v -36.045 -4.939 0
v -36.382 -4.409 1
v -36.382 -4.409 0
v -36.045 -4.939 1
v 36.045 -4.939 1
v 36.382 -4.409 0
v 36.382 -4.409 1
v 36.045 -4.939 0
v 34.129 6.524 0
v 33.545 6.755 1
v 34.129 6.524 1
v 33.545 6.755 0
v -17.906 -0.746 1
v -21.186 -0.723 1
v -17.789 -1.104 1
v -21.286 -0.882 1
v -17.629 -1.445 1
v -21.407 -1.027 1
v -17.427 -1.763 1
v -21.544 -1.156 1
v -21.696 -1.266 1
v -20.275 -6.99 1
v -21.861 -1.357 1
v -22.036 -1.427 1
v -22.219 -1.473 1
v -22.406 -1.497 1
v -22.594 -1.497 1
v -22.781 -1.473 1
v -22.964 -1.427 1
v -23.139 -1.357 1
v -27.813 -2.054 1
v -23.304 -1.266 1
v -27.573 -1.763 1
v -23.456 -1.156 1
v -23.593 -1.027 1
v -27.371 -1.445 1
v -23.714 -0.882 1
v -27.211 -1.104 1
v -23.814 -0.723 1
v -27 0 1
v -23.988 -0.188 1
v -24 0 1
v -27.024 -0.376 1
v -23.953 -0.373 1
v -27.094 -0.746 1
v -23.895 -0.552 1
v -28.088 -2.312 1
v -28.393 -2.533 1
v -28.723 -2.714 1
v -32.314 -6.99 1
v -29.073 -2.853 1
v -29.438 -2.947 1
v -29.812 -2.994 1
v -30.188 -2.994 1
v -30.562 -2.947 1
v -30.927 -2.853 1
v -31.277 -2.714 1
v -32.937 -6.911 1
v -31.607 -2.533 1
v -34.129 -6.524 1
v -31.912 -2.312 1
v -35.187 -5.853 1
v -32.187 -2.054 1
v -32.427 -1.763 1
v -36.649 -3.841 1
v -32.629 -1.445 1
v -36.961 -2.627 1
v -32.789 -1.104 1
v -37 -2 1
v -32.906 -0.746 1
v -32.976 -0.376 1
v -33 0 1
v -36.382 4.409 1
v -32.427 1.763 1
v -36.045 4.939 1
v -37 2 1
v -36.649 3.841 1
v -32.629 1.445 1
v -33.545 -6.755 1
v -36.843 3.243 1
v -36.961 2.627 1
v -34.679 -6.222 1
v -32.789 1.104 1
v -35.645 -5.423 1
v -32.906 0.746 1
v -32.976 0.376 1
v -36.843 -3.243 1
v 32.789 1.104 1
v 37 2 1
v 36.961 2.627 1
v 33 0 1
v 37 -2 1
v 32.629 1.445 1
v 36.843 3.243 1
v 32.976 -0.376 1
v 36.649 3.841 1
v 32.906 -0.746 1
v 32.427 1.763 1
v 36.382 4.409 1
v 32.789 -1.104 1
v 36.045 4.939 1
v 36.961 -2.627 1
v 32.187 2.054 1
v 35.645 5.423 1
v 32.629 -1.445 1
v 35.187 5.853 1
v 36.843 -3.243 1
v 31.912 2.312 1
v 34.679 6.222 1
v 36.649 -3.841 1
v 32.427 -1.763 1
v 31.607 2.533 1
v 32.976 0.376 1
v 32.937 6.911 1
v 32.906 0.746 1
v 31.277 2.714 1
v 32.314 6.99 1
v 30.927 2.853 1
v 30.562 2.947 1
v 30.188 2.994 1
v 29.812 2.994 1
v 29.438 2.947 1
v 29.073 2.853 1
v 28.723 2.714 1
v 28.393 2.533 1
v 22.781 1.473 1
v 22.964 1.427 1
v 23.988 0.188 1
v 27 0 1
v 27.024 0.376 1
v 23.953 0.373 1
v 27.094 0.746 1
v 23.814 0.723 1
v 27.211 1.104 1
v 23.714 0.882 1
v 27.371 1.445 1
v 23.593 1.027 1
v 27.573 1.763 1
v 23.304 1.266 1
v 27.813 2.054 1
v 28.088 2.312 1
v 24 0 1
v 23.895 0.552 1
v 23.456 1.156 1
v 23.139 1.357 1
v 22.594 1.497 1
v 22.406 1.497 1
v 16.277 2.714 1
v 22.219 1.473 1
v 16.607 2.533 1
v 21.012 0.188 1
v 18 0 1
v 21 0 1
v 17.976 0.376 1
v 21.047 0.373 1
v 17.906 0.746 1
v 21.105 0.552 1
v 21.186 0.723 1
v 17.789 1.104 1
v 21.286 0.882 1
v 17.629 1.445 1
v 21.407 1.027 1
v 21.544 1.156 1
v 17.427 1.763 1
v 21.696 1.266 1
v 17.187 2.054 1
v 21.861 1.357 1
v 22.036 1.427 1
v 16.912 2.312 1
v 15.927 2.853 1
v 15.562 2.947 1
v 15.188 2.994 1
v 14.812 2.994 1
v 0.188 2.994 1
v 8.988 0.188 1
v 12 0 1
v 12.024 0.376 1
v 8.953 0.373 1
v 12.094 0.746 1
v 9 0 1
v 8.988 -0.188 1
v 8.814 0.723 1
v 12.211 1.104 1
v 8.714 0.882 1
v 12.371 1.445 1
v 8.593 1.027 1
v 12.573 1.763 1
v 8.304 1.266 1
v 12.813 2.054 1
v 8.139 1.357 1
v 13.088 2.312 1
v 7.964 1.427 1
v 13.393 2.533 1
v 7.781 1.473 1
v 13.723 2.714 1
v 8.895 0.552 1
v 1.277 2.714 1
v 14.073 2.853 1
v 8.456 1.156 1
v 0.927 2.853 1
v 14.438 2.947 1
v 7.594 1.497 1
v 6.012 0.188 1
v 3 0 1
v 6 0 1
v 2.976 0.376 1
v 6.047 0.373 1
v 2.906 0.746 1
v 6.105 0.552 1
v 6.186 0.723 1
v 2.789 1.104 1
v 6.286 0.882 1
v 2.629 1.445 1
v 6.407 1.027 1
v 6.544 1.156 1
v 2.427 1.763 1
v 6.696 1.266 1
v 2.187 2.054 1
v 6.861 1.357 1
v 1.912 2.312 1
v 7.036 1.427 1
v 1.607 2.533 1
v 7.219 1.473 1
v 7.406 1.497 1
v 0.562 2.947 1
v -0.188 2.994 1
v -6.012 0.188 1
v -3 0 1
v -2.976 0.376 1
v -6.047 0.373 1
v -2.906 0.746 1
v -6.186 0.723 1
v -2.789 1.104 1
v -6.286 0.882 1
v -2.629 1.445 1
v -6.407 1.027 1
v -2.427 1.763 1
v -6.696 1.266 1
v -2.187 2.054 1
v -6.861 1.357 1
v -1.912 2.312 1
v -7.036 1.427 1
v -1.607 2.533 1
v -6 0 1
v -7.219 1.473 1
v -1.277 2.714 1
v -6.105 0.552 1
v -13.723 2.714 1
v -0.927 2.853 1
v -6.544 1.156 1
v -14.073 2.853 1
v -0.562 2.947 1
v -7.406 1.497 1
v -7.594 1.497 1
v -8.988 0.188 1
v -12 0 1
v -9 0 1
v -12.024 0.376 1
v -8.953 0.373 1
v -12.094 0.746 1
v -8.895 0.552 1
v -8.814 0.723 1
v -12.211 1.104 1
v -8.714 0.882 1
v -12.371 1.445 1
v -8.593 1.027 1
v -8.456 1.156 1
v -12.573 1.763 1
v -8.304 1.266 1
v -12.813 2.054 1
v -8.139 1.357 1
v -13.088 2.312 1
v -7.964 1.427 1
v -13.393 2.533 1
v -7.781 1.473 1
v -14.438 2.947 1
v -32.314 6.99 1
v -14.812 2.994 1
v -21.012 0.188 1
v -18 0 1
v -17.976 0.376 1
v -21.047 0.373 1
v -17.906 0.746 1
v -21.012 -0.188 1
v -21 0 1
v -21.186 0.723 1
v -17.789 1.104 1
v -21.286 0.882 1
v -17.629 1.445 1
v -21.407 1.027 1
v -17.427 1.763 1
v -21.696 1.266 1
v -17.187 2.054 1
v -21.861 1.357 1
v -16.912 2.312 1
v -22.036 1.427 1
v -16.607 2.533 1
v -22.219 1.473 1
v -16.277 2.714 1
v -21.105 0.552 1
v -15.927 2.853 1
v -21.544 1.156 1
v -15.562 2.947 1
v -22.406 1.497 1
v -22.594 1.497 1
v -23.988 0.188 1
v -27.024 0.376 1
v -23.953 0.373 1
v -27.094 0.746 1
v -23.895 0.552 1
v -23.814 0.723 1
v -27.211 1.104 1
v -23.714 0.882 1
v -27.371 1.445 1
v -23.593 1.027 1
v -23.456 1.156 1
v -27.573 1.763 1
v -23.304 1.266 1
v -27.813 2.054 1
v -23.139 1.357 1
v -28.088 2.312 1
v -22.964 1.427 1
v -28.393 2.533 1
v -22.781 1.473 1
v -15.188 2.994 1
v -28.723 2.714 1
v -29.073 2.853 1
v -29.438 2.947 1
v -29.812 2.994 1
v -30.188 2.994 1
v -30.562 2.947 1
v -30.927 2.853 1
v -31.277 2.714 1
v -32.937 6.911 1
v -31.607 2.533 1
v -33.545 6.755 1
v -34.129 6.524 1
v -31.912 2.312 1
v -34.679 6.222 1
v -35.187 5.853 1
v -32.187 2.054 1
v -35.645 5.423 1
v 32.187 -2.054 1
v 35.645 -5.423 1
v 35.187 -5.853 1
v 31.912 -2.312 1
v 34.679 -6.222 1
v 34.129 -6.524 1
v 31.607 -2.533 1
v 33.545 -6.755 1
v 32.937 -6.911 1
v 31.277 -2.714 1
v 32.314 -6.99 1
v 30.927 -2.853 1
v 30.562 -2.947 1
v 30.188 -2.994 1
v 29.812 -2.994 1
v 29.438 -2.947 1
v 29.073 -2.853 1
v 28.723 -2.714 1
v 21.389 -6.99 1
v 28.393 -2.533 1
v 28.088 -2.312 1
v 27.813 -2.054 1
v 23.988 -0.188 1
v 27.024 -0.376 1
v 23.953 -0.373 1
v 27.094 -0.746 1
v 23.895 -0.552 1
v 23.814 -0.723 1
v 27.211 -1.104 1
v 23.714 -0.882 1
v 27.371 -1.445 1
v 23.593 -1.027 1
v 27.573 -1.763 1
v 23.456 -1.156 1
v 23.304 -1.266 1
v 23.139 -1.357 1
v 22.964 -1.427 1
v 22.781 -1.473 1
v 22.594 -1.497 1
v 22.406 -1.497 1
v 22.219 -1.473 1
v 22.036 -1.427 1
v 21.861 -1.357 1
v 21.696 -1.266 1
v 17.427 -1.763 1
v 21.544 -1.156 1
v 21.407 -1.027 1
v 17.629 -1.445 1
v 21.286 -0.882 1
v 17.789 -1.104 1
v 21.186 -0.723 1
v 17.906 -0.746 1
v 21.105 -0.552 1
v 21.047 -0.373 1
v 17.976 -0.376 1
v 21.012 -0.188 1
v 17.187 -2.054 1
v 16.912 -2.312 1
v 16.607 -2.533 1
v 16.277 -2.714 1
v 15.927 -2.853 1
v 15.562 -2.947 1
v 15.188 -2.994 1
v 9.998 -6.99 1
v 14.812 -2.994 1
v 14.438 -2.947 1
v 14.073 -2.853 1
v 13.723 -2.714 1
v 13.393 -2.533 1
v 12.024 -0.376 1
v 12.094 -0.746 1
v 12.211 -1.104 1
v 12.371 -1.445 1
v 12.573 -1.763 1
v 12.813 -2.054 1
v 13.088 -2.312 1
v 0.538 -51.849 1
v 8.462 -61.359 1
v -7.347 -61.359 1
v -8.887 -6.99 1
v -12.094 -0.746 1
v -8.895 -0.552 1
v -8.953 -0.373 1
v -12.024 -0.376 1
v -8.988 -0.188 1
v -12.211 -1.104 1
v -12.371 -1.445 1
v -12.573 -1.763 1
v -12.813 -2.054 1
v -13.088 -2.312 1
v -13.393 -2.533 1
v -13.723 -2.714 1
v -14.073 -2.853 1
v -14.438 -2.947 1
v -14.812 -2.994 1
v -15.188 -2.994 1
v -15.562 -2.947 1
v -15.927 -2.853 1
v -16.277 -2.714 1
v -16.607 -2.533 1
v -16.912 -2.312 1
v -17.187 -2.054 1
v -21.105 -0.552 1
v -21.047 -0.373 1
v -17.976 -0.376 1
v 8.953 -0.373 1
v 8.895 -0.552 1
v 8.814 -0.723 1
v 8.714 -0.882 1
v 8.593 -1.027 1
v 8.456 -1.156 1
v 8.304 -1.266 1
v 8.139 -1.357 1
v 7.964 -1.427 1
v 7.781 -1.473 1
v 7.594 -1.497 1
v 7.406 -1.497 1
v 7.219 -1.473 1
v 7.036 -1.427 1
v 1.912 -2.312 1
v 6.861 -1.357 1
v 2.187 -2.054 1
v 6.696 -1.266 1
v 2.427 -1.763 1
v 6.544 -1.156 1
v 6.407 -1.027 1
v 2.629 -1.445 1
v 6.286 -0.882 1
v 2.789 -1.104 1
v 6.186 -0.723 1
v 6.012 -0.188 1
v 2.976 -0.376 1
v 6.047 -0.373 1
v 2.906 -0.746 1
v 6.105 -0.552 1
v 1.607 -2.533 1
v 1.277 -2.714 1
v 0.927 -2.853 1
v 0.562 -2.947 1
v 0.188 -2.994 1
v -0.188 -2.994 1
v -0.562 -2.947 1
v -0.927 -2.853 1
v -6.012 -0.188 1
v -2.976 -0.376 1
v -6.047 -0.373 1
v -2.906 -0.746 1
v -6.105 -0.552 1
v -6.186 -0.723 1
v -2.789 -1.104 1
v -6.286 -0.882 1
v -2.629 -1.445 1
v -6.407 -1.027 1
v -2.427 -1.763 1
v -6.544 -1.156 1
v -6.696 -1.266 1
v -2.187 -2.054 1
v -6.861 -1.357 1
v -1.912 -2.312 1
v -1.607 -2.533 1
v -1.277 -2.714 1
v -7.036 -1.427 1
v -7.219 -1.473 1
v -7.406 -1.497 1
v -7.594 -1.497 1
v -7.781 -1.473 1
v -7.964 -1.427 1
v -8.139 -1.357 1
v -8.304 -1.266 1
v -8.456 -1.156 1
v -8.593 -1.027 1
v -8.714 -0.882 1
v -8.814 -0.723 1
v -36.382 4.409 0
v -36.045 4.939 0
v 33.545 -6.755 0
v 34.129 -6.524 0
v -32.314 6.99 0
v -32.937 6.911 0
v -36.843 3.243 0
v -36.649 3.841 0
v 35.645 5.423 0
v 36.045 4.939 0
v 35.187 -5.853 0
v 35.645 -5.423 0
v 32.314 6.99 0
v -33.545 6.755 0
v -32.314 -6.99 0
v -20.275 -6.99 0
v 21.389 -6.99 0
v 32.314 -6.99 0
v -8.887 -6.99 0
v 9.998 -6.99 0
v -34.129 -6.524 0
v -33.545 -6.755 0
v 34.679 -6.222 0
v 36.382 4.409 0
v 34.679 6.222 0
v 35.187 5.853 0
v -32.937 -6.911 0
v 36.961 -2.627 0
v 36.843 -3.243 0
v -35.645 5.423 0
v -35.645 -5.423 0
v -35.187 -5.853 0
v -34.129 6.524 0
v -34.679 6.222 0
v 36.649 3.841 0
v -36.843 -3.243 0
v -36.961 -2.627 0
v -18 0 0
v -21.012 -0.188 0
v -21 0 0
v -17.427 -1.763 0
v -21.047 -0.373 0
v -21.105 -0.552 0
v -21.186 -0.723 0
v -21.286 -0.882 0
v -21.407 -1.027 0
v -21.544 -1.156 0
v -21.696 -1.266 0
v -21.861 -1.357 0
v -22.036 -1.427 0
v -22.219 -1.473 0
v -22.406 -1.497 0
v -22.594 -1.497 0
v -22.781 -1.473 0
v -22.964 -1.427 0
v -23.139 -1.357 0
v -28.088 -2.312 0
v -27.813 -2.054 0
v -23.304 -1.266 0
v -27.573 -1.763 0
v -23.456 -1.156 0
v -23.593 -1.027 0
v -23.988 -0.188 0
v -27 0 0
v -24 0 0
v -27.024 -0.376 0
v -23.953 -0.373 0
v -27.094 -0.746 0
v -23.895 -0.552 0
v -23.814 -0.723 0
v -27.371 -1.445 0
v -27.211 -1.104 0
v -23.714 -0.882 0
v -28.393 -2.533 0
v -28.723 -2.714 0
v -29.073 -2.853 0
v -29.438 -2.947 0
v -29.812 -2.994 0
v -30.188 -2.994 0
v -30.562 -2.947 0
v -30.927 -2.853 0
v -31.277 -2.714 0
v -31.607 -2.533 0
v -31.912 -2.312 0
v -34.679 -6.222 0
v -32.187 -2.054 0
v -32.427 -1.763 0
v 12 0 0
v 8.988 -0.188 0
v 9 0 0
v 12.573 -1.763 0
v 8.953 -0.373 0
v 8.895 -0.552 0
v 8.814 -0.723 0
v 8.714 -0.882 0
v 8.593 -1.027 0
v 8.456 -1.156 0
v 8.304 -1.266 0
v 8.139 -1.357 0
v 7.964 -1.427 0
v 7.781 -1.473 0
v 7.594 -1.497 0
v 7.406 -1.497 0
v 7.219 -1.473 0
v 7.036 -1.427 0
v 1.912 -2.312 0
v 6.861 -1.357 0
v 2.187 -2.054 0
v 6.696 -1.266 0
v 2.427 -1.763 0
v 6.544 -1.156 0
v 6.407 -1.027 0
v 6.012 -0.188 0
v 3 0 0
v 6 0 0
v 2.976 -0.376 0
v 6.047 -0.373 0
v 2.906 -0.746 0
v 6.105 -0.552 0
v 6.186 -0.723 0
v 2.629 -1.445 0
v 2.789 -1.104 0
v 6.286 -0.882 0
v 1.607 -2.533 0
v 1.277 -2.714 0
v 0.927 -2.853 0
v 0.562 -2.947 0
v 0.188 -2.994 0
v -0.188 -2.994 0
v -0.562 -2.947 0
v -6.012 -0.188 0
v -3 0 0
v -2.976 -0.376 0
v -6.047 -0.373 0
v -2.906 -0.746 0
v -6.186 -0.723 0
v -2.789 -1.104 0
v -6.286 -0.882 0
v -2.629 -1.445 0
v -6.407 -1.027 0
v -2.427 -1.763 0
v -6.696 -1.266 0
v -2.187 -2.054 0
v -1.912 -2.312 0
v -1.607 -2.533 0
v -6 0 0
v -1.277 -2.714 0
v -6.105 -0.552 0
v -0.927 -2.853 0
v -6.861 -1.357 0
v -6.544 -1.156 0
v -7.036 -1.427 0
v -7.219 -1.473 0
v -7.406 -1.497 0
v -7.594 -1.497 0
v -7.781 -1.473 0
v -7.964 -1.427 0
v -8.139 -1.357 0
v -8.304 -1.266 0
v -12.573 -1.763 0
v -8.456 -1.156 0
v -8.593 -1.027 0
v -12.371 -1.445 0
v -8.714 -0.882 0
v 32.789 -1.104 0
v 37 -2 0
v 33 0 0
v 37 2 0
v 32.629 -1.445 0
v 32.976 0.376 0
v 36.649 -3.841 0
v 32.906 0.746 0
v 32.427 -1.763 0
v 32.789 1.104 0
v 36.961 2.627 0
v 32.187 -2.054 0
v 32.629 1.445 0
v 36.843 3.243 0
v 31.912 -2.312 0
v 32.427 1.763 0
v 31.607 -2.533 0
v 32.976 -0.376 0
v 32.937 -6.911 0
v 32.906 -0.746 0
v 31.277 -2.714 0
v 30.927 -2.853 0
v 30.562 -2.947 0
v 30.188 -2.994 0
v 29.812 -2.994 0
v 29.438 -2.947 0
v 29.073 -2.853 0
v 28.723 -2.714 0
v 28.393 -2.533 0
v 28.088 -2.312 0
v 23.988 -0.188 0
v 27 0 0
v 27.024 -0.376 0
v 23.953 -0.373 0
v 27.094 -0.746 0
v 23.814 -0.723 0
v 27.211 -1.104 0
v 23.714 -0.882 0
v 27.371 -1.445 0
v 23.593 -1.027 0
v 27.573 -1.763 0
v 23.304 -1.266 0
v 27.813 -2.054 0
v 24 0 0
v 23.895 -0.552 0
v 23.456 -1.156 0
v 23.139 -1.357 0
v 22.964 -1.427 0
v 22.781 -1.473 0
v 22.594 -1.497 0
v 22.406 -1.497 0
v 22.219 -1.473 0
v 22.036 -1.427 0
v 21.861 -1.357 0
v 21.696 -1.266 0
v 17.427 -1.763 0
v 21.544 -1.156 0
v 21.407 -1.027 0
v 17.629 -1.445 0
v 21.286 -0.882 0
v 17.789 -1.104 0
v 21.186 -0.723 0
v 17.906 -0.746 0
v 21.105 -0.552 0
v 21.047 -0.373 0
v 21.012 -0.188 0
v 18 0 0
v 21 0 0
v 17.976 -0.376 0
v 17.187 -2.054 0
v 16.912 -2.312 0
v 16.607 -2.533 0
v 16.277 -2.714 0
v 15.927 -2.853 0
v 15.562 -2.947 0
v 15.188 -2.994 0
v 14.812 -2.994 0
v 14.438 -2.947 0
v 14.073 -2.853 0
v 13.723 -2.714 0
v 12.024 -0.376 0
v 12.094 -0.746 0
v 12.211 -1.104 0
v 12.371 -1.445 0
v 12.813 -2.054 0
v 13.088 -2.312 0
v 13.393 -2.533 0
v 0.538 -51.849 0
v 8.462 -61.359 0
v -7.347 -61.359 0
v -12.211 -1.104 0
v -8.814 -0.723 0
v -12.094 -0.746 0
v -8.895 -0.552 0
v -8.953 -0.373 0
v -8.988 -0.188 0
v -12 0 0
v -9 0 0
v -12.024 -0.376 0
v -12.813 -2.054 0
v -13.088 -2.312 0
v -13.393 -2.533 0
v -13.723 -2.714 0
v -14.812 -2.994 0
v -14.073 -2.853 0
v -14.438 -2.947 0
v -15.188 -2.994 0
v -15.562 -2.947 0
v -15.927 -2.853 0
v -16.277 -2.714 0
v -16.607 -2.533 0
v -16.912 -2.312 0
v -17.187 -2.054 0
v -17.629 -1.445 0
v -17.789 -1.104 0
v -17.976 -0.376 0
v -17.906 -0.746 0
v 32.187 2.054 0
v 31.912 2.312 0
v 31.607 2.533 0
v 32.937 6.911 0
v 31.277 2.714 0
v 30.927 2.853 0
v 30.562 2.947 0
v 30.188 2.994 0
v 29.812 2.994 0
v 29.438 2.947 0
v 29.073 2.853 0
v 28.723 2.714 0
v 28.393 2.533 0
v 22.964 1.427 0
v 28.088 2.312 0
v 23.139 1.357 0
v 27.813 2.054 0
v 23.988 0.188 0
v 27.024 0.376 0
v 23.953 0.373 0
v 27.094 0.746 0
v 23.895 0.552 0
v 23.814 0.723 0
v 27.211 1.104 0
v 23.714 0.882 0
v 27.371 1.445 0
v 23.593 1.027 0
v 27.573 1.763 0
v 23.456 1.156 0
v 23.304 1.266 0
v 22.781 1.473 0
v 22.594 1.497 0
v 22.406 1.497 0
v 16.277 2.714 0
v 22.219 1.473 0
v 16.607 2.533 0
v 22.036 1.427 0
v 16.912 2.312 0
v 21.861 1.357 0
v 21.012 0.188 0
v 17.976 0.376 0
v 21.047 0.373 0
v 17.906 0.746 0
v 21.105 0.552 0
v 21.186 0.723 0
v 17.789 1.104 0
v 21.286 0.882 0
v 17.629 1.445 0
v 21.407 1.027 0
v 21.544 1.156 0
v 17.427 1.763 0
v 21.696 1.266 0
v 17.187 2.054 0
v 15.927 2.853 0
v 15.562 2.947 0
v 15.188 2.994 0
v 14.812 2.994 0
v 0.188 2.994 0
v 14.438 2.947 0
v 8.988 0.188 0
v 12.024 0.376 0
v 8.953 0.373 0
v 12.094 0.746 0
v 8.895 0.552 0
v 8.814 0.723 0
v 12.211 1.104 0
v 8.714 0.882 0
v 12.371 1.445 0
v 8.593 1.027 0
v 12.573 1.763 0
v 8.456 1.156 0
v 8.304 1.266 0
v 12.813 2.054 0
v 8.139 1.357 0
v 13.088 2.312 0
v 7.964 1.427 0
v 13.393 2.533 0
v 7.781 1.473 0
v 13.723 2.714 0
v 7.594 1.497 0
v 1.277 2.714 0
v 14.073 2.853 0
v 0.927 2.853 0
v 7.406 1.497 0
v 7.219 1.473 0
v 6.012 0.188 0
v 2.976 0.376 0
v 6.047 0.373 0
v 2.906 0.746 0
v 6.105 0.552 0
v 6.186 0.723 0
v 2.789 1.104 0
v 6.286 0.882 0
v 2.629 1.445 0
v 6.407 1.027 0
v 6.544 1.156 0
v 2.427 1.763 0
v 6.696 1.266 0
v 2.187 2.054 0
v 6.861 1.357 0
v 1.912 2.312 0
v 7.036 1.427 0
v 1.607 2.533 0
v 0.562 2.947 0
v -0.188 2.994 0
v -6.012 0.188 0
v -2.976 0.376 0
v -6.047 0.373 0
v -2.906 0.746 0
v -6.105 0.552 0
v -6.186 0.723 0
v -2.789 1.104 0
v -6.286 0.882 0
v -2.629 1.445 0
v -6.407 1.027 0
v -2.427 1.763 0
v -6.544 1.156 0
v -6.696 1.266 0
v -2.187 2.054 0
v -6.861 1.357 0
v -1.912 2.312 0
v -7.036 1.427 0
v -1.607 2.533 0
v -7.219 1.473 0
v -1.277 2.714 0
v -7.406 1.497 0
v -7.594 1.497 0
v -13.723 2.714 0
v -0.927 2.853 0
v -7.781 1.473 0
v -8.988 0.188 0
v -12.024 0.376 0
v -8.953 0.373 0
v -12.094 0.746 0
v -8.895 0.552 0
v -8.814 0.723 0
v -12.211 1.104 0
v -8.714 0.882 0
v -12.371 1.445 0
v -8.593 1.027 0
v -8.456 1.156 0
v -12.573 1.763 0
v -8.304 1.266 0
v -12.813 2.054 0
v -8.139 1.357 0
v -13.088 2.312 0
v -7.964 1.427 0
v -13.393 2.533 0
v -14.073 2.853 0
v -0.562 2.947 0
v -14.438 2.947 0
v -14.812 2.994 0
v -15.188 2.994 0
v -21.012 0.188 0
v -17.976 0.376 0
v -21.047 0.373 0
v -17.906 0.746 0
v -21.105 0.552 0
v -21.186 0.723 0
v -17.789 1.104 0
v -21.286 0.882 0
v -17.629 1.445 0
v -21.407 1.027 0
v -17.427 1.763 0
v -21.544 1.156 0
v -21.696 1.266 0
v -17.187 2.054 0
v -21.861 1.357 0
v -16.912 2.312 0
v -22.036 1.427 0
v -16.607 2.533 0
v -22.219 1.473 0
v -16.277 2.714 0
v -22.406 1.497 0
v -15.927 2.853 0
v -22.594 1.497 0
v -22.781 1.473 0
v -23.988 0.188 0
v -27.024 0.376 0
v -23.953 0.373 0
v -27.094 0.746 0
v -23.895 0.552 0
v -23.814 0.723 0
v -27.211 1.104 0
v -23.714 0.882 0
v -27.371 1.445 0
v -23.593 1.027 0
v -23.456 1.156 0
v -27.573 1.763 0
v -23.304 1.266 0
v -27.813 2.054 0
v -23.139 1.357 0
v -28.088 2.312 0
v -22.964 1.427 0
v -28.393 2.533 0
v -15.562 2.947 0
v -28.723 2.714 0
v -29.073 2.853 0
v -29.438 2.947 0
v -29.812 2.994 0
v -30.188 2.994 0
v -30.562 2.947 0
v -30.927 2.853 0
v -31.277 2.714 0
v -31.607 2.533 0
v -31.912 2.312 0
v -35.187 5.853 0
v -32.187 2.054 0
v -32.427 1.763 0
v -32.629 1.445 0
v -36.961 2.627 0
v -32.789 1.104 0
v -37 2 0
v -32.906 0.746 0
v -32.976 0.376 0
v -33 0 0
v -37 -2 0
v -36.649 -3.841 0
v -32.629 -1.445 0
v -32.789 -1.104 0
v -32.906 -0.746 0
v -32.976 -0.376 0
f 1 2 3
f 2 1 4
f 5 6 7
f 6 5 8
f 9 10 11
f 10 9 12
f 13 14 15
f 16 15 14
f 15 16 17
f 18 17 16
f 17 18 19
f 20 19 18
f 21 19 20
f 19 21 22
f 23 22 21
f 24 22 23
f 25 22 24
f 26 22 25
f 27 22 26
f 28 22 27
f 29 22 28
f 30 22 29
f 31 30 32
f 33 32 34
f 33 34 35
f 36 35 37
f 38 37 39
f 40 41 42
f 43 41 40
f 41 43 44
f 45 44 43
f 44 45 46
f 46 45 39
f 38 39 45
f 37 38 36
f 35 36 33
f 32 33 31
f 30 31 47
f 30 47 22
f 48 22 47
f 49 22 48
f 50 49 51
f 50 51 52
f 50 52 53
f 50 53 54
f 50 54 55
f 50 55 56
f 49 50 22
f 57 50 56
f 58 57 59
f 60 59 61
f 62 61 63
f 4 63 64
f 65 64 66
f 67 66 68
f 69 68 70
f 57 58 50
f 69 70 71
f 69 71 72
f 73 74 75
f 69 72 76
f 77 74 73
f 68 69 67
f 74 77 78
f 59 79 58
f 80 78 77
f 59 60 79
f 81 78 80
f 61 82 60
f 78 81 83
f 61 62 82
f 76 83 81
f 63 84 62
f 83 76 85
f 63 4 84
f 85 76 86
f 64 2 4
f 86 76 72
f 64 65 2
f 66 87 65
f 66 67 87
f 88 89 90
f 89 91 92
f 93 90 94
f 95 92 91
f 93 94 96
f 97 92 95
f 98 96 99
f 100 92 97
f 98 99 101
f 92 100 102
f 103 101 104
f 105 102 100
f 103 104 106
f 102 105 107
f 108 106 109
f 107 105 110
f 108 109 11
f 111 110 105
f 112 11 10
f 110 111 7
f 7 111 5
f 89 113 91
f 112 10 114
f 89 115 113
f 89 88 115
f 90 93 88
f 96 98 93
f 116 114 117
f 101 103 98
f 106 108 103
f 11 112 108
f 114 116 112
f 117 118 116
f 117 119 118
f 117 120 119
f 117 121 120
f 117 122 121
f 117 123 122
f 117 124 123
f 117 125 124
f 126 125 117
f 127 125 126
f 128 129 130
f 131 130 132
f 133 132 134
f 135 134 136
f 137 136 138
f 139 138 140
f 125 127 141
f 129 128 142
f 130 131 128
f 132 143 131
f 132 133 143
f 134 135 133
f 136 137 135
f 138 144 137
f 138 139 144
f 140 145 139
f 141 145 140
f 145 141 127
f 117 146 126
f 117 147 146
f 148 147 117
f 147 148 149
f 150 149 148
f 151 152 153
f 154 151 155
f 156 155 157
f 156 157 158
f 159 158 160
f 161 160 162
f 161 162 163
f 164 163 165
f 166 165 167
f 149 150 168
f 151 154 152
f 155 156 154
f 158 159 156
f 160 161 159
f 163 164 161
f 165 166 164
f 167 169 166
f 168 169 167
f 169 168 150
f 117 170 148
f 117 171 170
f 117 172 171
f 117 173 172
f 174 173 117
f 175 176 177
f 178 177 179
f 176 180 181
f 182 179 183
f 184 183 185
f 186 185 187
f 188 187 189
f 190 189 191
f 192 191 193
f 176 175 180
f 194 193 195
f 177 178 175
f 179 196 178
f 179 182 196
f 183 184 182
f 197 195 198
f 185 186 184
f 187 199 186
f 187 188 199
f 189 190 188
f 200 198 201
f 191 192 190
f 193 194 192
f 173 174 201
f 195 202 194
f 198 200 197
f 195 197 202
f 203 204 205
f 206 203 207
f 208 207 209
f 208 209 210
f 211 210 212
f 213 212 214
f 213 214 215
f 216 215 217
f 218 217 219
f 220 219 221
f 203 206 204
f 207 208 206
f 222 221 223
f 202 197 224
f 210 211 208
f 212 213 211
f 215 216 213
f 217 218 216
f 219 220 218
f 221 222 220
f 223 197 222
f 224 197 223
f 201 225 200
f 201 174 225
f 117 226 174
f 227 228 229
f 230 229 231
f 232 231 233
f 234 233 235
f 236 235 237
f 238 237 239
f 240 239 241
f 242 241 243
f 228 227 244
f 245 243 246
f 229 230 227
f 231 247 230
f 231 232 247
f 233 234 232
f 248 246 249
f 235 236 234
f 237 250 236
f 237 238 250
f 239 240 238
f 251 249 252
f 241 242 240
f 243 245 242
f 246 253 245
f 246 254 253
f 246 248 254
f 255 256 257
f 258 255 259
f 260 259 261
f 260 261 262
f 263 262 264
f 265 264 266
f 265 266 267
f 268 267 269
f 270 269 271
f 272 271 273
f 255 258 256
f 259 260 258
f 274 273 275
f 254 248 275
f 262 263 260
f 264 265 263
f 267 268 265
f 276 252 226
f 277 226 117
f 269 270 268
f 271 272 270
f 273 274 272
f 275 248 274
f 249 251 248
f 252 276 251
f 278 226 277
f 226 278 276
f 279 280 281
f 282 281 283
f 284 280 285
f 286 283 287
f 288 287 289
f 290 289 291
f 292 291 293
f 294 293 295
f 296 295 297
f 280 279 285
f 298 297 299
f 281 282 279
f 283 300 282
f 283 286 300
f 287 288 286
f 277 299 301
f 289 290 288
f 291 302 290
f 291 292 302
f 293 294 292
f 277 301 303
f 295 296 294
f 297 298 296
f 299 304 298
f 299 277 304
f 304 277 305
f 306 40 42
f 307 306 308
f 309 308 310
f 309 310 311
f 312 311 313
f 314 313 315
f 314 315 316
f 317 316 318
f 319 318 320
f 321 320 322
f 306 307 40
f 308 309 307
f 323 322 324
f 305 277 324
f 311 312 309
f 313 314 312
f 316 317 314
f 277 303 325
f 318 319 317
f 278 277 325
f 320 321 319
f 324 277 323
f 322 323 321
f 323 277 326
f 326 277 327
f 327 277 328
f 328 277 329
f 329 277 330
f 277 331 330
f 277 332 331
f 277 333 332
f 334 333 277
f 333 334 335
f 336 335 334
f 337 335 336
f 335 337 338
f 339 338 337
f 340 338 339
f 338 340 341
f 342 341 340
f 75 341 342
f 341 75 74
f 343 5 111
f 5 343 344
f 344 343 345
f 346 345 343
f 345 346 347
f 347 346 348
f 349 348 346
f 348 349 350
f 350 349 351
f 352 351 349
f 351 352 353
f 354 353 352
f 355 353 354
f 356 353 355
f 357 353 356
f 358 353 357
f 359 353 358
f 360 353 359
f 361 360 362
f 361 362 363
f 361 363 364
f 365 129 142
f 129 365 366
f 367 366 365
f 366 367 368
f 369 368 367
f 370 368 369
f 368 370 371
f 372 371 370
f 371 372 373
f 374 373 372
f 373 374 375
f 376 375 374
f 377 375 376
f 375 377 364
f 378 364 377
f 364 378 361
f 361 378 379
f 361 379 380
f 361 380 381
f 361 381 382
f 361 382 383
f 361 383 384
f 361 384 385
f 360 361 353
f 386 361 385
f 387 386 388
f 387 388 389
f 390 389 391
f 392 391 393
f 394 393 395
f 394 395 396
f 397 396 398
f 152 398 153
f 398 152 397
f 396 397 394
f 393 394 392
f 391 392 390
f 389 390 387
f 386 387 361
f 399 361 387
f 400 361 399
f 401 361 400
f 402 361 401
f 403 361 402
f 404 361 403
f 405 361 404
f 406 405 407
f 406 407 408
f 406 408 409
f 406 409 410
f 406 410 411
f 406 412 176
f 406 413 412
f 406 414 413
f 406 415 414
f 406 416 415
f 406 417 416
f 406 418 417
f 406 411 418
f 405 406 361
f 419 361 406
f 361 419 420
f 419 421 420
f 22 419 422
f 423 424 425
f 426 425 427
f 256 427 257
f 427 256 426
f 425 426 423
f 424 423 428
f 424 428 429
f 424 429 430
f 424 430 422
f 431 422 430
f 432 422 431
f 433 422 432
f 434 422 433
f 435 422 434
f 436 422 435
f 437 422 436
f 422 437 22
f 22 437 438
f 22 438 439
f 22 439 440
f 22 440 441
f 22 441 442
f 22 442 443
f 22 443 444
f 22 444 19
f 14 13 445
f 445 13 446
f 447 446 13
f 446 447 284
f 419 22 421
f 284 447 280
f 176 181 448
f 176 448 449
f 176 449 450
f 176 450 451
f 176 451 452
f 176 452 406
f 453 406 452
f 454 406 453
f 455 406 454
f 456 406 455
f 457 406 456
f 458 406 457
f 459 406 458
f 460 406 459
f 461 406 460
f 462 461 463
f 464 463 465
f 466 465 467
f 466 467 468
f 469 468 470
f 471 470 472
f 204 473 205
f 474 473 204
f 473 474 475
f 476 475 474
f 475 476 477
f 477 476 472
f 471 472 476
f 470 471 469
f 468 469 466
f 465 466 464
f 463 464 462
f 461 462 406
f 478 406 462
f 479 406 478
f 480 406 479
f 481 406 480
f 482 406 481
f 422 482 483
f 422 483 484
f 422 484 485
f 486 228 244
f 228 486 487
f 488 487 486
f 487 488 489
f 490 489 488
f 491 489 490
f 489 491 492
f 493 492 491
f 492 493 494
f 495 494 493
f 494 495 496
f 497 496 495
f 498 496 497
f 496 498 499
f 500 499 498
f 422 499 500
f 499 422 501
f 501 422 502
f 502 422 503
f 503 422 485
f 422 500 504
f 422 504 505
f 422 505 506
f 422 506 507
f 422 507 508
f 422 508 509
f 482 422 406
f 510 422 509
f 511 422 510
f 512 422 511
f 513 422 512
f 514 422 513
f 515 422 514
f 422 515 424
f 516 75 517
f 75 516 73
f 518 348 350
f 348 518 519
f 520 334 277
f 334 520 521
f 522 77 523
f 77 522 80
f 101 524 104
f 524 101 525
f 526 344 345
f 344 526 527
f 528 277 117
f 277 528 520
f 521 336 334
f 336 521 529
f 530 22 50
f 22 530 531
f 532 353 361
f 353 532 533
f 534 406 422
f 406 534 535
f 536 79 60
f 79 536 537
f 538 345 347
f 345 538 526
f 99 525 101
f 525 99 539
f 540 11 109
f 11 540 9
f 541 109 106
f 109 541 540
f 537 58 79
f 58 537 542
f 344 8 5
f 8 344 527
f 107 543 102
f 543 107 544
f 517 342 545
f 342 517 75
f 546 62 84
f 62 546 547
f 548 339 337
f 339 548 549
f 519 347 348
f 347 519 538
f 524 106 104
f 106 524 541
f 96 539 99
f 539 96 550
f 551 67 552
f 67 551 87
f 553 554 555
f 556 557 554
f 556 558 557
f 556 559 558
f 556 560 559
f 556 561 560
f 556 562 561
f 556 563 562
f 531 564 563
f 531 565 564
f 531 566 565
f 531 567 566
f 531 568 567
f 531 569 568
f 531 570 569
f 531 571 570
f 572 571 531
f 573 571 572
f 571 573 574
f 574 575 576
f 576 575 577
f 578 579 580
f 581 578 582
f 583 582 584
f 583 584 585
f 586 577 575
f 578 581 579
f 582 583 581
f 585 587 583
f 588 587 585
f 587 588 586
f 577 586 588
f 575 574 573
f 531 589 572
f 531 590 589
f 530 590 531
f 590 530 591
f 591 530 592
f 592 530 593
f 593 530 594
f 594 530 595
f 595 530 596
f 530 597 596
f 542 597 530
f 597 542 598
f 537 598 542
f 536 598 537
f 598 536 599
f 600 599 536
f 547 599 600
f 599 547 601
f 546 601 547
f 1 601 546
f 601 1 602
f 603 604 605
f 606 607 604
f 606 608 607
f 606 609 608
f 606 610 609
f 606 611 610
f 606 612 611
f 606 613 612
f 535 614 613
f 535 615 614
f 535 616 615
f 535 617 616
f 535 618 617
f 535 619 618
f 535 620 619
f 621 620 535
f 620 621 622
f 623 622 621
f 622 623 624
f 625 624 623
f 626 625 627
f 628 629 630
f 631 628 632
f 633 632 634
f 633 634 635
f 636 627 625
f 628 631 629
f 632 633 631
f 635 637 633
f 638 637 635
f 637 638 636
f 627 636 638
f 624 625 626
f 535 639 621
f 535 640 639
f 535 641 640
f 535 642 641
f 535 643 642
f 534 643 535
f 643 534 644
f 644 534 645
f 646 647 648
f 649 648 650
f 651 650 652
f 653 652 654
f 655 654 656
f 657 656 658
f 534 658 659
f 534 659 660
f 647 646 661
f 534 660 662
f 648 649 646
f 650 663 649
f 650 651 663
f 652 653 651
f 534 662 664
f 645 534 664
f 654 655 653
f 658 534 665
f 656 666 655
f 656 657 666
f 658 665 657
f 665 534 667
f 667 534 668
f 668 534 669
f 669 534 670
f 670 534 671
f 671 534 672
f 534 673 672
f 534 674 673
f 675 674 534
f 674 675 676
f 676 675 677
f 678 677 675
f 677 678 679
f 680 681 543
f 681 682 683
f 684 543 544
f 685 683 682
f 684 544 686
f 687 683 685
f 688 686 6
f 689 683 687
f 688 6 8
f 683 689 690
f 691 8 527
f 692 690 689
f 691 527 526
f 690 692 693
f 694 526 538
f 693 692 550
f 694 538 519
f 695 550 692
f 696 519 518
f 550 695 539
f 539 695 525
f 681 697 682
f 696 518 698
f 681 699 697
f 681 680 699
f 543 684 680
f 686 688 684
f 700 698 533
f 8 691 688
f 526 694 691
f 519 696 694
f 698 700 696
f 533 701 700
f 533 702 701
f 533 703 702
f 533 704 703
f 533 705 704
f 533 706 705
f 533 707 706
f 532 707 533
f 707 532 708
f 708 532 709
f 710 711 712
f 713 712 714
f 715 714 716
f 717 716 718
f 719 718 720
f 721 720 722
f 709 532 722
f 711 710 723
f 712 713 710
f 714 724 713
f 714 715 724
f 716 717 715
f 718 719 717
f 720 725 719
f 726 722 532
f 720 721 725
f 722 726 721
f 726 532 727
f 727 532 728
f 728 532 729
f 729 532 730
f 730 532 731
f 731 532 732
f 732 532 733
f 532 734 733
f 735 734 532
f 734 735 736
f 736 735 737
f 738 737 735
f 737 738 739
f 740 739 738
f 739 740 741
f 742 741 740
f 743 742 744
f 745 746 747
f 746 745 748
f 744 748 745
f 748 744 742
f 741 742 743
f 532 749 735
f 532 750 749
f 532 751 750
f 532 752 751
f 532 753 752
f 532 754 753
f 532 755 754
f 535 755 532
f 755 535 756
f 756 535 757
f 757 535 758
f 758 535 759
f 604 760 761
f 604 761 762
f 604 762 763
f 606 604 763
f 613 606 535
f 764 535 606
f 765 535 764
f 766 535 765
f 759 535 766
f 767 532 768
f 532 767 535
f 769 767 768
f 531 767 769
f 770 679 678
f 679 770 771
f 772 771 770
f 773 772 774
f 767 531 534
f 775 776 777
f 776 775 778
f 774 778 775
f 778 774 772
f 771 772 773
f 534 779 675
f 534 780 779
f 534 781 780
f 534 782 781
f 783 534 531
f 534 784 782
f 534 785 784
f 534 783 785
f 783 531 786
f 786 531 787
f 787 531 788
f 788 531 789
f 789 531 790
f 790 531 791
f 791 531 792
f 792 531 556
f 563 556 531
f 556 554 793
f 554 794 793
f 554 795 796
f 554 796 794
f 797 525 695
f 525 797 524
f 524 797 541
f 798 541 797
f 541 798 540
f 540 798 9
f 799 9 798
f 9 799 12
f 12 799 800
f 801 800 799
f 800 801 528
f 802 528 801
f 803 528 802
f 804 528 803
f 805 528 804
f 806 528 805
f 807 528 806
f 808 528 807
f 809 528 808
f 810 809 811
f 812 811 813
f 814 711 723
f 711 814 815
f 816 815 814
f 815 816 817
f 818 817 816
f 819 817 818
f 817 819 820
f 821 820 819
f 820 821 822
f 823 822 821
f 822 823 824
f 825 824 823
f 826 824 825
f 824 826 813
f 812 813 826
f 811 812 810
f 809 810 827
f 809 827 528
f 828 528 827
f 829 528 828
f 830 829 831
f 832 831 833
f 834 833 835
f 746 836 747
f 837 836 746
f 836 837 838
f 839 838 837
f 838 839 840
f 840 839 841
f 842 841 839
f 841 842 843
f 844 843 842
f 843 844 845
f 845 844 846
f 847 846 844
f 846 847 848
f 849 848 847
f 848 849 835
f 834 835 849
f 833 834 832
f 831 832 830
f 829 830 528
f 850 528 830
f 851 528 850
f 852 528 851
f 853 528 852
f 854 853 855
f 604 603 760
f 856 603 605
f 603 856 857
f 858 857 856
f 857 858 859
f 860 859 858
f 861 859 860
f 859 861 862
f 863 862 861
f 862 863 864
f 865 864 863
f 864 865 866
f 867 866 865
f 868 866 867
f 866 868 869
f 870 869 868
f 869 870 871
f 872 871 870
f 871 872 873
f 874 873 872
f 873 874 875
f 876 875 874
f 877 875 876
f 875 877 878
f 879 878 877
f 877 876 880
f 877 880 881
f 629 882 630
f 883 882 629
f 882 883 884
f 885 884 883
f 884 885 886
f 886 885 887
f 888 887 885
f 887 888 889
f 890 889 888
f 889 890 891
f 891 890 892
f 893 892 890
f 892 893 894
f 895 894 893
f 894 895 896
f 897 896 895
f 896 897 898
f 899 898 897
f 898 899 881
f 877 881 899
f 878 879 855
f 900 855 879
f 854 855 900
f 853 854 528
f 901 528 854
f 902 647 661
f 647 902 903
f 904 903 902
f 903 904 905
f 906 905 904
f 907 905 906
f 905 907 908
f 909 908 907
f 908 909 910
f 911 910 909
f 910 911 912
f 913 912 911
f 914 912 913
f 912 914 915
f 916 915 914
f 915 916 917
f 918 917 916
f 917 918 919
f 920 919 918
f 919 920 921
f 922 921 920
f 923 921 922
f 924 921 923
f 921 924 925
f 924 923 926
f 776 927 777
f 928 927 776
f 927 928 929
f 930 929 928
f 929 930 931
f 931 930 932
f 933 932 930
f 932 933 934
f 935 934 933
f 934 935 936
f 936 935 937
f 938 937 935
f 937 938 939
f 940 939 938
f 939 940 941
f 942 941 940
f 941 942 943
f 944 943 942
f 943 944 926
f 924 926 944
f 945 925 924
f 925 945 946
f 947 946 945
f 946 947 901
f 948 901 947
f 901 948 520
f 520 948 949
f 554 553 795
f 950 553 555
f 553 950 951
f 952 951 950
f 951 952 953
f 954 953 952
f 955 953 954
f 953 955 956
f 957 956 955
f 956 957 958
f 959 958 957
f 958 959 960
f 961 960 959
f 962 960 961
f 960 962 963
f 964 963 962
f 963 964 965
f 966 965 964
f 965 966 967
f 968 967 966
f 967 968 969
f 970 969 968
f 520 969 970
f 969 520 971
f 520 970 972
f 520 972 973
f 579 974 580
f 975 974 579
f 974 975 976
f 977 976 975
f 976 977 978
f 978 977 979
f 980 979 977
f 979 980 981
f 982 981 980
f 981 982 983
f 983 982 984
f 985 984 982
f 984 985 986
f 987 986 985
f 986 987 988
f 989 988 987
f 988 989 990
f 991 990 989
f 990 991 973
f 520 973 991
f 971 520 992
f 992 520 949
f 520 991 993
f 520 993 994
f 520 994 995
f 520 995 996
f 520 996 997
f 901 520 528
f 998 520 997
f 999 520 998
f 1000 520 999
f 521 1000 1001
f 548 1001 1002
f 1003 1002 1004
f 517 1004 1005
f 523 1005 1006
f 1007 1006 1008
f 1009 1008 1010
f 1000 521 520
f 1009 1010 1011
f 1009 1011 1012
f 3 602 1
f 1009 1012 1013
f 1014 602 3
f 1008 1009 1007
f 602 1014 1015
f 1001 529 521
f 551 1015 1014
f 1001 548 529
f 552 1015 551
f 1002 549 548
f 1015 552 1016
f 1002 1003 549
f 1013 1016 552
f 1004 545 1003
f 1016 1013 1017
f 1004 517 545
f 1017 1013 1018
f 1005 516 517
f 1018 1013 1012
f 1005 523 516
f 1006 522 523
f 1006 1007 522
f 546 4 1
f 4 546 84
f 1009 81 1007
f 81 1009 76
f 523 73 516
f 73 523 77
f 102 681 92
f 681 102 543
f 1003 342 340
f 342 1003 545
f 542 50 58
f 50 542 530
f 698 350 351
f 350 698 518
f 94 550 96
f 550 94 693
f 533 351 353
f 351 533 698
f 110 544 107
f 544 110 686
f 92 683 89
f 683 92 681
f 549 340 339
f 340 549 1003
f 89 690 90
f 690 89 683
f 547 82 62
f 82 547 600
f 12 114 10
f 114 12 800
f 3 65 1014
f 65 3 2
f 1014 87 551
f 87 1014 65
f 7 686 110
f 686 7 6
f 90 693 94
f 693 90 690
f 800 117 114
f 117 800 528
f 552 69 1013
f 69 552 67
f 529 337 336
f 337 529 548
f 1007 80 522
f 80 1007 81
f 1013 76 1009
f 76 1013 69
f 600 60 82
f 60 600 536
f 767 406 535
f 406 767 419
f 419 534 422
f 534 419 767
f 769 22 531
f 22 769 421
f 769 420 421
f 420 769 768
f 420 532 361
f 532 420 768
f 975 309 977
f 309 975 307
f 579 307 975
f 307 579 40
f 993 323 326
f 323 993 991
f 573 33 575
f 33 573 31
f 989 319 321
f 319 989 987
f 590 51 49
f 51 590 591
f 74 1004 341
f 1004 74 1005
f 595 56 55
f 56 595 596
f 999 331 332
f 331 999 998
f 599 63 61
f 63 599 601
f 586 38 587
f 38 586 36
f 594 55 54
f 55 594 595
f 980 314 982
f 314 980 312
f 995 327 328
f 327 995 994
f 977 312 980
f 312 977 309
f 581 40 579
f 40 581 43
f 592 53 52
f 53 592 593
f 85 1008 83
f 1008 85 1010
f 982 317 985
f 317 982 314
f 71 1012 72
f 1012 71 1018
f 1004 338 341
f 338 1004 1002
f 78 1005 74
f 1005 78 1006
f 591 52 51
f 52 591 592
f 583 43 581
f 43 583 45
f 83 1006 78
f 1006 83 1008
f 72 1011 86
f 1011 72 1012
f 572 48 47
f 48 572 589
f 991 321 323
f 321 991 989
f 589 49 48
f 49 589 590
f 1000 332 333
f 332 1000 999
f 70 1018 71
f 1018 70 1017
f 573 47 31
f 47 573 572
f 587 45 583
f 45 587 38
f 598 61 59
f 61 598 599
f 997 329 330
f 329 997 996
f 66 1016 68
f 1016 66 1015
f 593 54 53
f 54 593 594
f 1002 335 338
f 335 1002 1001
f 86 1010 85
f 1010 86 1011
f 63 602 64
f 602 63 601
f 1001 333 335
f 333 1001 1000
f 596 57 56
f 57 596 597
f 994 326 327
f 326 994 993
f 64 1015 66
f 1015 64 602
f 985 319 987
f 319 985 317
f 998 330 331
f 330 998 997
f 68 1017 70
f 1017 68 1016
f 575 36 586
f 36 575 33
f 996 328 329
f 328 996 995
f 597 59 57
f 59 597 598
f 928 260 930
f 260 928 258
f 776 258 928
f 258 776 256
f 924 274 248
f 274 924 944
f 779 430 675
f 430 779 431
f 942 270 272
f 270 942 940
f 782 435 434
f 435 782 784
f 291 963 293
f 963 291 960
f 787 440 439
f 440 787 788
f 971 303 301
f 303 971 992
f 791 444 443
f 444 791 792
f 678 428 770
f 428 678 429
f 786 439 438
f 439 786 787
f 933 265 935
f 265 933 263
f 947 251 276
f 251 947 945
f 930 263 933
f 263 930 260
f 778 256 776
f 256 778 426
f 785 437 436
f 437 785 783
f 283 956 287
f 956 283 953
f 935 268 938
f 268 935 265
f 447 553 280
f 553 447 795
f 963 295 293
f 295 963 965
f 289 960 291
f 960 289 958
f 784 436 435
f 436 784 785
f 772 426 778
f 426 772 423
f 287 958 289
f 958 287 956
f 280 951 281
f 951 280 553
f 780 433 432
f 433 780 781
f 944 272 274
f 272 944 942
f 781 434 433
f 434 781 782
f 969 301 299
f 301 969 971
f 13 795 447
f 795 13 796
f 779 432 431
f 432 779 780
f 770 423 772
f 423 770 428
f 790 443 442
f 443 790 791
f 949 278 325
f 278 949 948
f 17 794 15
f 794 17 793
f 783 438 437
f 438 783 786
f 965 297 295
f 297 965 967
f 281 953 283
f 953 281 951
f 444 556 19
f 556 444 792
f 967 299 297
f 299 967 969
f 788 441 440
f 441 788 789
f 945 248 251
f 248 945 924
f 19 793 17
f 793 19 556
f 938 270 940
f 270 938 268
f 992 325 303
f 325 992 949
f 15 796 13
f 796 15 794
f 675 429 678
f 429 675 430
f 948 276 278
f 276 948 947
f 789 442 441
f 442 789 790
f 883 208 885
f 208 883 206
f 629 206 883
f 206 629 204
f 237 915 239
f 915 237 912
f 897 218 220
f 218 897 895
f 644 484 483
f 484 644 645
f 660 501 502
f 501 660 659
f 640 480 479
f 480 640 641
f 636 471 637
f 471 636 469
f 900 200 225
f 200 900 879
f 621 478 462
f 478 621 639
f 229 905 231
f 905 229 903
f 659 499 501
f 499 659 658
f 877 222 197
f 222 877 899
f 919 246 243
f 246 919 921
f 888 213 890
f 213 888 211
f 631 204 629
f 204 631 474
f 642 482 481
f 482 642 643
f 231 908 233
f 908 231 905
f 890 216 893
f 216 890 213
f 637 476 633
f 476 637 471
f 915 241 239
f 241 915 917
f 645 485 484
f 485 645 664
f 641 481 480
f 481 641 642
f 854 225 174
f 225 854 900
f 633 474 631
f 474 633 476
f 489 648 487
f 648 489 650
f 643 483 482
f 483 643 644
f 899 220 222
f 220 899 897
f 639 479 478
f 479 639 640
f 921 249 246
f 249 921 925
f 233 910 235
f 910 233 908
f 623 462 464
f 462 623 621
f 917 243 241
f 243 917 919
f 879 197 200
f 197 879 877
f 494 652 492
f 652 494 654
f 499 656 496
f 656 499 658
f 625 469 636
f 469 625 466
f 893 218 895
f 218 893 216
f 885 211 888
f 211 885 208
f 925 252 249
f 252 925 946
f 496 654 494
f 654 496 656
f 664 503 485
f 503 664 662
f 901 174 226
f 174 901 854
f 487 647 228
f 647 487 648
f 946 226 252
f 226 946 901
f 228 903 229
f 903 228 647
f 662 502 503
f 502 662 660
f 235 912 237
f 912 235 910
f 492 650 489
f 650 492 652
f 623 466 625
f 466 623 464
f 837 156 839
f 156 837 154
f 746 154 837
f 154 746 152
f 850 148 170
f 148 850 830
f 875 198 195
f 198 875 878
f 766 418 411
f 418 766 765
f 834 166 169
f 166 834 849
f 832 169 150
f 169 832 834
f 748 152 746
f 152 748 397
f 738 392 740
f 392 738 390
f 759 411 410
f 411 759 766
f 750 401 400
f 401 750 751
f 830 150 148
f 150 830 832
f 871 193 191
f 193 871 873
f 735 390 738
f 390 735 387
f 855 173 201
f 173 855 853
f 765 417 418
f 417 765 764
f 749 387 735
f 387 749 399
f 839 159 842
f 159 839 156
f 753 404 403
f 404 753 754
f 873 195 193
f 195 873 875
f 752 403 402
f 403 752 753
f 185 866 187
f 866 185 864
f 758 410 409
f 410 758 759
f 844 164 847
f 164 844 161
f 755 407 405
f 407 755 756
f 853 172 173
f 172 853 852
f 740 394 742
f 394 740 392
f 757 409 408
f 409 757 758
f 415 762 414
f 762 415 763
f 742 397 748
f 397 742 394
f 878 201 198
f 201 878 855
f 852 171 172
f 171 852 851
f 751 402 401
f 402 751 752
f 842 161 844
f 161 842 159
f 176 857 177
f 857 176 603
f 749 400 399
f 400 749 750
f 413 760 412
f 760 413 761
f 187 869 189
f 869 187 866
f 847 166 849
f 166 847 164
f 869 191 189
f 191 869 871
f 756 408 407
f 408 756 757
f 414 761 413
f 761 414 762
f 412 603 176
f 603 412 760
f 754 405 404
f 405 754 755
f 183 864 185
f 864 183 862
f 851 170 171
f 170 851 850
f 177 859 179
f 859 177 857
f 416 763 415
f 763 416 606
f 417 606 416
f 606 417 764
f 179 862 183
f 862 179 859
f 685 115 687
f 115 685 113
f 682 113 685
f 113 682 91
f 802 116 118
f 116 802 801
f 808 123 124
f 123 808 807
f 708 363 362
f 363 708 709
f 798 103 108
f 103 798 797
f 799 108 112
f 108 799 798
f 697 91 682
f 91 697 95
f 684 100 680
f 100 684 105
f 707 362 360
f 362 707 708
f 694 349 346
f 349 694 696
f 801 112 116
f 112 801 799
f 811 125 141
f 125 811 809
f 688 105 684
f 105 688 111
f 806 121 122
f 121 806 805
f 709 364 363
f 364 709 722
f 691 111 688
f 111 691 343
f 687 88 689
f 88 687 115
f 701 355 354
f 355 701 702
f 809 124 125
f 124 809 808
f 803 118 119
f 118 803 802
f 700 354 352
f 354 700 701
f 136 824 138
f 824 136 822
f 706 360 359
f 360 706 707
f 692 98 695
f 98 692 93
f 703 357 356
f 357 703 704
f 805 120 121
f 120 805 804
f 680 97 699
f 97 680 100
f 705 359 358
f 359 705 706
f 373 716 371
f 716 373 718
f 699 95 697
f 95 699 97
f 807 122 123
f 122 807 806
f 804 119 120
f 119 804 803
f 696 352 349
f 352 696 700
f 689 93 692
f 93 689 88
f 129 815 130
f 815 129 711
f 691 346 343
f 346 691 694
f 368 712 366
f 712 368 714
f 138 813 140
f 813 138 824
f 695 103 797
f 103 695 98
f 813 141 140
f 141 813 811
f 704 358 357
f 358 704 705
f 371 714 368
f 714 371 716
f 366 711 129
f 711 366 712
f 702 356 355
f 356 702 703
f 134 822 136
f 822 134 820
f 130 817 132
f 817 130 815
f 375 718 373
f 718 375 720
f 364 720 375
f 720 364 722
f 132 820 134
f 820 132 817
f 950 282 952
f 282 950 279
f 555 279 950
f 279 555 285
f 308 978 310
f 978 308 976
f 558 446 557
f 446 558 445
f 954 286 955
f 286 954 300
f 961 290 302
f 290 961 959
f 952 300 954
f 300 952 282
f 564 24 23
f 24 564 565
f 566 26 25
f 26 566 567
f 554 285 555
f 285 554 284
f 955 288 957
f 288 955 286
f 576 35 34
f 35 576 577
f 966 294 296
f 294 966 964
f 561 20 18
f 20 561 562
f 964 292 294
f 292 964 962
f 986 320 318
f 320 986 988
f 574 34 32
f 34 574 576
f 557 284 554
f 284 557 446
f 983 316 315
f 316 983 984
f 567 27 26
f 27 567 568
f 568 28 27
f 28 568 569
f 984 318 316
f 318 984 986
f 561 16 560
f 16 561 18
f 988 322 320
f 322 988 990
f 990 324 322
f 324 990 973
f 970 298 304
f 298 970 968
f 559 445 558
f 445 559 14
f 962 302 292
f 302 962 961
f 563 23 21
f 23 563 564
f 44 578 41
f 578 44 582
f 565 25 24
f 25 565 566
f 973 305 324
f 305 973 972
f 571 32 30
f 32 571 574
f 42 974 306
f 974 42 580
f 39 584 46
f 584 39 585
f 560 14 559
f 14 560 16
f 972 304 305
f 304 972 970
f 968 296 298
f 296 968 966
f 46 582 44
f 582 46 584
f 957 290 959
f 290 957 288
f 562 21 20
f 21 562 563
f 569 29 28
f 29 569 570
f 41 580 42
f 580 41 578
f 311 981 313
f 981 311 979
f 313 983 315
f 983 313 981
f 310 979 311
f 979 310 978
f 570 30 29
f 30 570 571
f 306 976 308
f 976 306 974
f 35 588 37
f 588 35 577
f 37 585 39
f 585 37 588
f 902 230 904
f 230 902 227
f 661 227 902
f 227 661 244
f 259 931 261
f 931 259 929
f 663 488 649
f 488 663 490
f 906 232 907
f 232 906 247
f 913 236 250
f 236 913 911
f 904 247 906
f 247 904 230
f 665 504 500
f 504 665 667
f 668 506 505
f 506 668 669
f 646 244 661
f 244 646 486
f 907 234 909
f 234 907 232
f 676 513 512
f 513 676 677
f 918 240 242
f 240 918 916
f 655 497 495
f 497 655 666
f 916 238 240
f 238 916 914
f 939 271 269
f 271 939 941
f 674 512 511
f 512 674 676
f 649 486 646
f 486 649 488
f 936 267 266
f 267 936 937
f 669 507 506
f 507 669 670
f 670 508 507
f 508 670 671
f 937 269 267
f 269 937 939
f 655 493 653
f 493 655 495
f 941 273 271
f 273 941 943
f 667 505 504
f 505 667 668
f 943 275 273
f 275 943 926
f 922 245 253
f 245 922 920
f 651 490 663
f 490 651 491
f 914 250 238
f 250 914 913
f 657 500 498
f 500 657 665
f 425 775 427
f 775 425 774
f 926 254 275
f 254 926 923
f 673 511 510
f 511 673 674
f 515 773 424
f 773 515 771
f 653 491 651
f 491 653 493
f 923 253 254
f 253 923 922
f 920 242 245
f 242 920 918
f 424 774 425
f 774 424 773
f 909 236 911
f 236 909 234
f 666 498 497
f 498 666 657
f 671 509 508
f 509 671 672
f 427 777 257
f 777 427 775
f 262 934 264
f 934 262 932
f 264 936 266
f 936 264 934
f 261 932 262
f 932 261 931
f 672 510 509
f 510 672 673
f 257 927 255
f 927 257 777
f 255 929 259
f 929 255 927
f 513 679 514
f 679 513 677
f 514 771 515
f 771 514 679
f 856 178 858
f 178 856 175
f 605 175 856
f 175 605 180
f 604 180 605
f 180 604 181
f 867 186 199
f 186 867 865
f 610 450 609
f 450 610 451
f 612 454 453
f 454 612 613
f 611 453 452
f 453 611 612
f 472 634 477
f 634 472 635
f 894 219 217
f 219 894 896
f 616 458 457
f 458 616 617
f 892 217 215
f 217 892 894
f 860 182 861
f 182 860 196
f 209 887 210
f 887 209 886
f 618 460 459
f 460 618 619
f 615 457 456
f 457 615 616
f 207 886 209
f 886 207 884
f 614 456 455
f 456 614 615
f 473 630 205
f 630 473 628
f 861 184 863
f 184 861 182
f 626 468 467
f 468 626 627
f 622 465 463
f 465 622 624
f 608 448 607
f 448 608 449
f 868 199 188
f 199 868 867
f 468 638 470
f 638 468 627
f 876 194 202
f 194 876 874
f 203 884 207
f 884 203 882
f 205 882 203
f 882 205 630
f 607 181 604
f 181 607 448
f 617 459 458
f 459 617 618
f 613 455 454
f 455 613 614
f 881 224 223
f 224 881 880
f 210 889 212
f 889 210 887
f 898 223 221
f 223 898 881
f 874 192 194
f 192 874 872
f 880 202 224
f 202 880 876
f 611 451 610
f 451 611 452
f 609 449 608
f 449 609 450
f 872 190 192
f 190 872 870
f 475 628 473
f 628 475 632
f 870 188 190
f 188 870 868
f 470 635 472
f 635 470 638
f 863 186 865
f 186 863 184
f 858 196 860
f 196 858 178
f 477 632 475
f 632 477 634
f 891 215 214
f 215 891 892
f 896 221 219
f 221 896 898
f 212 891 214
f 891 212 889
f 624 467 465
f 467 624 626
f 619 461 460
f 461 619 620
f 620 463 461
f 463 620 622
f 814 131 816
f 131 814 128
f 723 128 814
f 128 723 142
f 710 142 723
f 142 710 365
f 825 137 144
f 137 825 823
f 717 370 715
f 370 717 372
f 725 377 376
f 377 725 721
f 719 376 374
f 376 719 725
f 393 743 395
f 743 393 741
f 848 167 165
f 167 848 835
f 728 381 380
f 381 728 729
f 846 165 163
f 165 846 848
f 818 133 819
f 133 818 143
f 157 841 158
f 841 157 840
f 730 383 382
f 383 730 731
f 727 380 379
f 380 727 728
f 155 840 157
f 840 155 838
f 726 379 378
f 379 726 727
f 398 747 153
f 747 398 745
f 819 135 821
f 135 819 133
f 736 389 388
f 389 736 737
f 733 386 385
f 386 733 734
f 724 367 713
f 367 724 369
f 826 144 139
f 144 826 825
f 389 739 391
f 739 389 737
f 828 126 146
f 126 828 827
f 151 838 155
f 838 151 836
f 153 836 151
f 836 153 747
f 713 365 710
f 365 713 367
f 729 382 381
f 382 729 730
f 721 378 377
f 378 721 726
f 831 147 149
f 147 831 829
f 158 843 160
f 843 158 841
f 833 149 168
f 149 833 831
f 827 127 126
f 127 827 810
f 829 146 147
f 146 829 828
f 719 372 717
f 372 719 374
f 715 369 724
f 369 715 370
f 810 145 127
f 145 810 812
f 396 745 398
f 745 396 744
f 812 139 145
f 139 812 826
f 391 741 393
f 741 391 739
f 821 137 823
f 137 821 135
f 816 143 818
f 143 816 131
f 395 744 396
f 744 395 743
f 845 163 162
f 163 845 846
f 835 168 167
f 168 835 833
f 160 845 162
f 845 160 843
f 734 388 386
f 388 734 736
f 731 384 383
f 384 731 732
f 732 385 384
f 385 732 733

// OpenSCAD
$fn = 50;


difference() {
	union() {
		hull() {
			translate(v = [-32.0000000000, 2.0000000000, 0]) {
				cylinder(h = 1, r = 5);
			}
			translate(v = [32.0000000000, 2.0000000000, 0]) {
				cylinder(h = 1, r = 5);
			}
			translate(v = [-32.0000000000, -2.0000000000, 0]) {
				cylinder(h = 1, r = 5);
			}
			translate(v = [32.0000000000, -2.0000000000, 0]) {
				cylinder(h = 1, r = 5);
			}
		}
		translate(v = [0, -5, 0]) {
			linear_extrude(height = 1) {
				text(font = "DejaVu Sans Mono:style=Bold", halign = "center", size = 57.0000000000, text = "V", valign = "top");
			}
		}
	}
	union() {
		translate(v = [-30.0000000000, 0.0000000000, 0]) {
			translate(v = [0, 0, -100]) {
				cylinder(h = 200, r = 3.0000000000);
			}
		}
		translate(v = [-15.0000000000, 0.0000000000, 0]) {
			translate(v = [0, 0, -100]) {
				cylinder(h = 200, r = 3.0000000000);
			}
		}
		translate(v = [0, 0, -100]) {
			cylinder(h = 200, r = 3.0000000000);
		}
		translate(v = [15.0000000000, 0.0000000000, 0]) {
			translate(v = [0, 0, -100]) {
				cylinder(h = 200, r = 3.0000000000);
			}
		}
		translate(v = [30.0000000000, 0.0000000000, 0]) {
			translate(v = [0, 0, -100]) {
				cylinder(h = 200, r = 3.0000000000);
			}
		}
		translate(v = [-30.0000000000, 0.0000000000, 0]) {
			translate(v = [0, 0, -100]) {
				cylinder(h = 200, r = 1.5000000000);
			}
		}
		translate(v = [-22.5000000000, 0.0000000000, 0]) {
			translate(v = [0, 0, -100]) {
				cylinder(h = 200, r = 1.5000000000);
			}
		}
		translate(v = [-15.0000000000, 0.0000000000, 0]) {
			translate(v = [0, 0, -100]) {
				cylinder(h = 200, r = 1.5000000000);
			}
		}
		translate(v = [-7.5000000000, 0.0000000000, 0]) {
			translate(v = [0, 0, -100]) {
				cylinder(h = 200, r = 1.5000000000);
			}
		}
		translate(v = [0, 0, -100]) {
			cylinder(h = 200, r = 1.5000000000);
		}
		translate(v = [7.5000000000, 0.0000000000, 0]) {
			translate(v = [0, 0, -100]) {
				cylinder(h = 200, r = 1.5000000000);
			}
		}
		translate(v = [15.0000000000, 0.0000000000, 0]) {
			translate(v = [0, 0, -100]) {
				cylinder(h = 200, r = 1.5000000000);
			}
		}
		translate(v = [22.5000000000, 0.0000000000, 0]) {
			translate(v = [0, 0, -100]) {
				cylinder(h = 200, r = 1.5000000000);
			}
		}
		translate(v = [30.0000000000, 0.0000000000, 0]) {
			translate(v = [0, 0, -100]) {
				cylinder(h = 200, r = 1.5000000000);
			}
		}
	}
}
